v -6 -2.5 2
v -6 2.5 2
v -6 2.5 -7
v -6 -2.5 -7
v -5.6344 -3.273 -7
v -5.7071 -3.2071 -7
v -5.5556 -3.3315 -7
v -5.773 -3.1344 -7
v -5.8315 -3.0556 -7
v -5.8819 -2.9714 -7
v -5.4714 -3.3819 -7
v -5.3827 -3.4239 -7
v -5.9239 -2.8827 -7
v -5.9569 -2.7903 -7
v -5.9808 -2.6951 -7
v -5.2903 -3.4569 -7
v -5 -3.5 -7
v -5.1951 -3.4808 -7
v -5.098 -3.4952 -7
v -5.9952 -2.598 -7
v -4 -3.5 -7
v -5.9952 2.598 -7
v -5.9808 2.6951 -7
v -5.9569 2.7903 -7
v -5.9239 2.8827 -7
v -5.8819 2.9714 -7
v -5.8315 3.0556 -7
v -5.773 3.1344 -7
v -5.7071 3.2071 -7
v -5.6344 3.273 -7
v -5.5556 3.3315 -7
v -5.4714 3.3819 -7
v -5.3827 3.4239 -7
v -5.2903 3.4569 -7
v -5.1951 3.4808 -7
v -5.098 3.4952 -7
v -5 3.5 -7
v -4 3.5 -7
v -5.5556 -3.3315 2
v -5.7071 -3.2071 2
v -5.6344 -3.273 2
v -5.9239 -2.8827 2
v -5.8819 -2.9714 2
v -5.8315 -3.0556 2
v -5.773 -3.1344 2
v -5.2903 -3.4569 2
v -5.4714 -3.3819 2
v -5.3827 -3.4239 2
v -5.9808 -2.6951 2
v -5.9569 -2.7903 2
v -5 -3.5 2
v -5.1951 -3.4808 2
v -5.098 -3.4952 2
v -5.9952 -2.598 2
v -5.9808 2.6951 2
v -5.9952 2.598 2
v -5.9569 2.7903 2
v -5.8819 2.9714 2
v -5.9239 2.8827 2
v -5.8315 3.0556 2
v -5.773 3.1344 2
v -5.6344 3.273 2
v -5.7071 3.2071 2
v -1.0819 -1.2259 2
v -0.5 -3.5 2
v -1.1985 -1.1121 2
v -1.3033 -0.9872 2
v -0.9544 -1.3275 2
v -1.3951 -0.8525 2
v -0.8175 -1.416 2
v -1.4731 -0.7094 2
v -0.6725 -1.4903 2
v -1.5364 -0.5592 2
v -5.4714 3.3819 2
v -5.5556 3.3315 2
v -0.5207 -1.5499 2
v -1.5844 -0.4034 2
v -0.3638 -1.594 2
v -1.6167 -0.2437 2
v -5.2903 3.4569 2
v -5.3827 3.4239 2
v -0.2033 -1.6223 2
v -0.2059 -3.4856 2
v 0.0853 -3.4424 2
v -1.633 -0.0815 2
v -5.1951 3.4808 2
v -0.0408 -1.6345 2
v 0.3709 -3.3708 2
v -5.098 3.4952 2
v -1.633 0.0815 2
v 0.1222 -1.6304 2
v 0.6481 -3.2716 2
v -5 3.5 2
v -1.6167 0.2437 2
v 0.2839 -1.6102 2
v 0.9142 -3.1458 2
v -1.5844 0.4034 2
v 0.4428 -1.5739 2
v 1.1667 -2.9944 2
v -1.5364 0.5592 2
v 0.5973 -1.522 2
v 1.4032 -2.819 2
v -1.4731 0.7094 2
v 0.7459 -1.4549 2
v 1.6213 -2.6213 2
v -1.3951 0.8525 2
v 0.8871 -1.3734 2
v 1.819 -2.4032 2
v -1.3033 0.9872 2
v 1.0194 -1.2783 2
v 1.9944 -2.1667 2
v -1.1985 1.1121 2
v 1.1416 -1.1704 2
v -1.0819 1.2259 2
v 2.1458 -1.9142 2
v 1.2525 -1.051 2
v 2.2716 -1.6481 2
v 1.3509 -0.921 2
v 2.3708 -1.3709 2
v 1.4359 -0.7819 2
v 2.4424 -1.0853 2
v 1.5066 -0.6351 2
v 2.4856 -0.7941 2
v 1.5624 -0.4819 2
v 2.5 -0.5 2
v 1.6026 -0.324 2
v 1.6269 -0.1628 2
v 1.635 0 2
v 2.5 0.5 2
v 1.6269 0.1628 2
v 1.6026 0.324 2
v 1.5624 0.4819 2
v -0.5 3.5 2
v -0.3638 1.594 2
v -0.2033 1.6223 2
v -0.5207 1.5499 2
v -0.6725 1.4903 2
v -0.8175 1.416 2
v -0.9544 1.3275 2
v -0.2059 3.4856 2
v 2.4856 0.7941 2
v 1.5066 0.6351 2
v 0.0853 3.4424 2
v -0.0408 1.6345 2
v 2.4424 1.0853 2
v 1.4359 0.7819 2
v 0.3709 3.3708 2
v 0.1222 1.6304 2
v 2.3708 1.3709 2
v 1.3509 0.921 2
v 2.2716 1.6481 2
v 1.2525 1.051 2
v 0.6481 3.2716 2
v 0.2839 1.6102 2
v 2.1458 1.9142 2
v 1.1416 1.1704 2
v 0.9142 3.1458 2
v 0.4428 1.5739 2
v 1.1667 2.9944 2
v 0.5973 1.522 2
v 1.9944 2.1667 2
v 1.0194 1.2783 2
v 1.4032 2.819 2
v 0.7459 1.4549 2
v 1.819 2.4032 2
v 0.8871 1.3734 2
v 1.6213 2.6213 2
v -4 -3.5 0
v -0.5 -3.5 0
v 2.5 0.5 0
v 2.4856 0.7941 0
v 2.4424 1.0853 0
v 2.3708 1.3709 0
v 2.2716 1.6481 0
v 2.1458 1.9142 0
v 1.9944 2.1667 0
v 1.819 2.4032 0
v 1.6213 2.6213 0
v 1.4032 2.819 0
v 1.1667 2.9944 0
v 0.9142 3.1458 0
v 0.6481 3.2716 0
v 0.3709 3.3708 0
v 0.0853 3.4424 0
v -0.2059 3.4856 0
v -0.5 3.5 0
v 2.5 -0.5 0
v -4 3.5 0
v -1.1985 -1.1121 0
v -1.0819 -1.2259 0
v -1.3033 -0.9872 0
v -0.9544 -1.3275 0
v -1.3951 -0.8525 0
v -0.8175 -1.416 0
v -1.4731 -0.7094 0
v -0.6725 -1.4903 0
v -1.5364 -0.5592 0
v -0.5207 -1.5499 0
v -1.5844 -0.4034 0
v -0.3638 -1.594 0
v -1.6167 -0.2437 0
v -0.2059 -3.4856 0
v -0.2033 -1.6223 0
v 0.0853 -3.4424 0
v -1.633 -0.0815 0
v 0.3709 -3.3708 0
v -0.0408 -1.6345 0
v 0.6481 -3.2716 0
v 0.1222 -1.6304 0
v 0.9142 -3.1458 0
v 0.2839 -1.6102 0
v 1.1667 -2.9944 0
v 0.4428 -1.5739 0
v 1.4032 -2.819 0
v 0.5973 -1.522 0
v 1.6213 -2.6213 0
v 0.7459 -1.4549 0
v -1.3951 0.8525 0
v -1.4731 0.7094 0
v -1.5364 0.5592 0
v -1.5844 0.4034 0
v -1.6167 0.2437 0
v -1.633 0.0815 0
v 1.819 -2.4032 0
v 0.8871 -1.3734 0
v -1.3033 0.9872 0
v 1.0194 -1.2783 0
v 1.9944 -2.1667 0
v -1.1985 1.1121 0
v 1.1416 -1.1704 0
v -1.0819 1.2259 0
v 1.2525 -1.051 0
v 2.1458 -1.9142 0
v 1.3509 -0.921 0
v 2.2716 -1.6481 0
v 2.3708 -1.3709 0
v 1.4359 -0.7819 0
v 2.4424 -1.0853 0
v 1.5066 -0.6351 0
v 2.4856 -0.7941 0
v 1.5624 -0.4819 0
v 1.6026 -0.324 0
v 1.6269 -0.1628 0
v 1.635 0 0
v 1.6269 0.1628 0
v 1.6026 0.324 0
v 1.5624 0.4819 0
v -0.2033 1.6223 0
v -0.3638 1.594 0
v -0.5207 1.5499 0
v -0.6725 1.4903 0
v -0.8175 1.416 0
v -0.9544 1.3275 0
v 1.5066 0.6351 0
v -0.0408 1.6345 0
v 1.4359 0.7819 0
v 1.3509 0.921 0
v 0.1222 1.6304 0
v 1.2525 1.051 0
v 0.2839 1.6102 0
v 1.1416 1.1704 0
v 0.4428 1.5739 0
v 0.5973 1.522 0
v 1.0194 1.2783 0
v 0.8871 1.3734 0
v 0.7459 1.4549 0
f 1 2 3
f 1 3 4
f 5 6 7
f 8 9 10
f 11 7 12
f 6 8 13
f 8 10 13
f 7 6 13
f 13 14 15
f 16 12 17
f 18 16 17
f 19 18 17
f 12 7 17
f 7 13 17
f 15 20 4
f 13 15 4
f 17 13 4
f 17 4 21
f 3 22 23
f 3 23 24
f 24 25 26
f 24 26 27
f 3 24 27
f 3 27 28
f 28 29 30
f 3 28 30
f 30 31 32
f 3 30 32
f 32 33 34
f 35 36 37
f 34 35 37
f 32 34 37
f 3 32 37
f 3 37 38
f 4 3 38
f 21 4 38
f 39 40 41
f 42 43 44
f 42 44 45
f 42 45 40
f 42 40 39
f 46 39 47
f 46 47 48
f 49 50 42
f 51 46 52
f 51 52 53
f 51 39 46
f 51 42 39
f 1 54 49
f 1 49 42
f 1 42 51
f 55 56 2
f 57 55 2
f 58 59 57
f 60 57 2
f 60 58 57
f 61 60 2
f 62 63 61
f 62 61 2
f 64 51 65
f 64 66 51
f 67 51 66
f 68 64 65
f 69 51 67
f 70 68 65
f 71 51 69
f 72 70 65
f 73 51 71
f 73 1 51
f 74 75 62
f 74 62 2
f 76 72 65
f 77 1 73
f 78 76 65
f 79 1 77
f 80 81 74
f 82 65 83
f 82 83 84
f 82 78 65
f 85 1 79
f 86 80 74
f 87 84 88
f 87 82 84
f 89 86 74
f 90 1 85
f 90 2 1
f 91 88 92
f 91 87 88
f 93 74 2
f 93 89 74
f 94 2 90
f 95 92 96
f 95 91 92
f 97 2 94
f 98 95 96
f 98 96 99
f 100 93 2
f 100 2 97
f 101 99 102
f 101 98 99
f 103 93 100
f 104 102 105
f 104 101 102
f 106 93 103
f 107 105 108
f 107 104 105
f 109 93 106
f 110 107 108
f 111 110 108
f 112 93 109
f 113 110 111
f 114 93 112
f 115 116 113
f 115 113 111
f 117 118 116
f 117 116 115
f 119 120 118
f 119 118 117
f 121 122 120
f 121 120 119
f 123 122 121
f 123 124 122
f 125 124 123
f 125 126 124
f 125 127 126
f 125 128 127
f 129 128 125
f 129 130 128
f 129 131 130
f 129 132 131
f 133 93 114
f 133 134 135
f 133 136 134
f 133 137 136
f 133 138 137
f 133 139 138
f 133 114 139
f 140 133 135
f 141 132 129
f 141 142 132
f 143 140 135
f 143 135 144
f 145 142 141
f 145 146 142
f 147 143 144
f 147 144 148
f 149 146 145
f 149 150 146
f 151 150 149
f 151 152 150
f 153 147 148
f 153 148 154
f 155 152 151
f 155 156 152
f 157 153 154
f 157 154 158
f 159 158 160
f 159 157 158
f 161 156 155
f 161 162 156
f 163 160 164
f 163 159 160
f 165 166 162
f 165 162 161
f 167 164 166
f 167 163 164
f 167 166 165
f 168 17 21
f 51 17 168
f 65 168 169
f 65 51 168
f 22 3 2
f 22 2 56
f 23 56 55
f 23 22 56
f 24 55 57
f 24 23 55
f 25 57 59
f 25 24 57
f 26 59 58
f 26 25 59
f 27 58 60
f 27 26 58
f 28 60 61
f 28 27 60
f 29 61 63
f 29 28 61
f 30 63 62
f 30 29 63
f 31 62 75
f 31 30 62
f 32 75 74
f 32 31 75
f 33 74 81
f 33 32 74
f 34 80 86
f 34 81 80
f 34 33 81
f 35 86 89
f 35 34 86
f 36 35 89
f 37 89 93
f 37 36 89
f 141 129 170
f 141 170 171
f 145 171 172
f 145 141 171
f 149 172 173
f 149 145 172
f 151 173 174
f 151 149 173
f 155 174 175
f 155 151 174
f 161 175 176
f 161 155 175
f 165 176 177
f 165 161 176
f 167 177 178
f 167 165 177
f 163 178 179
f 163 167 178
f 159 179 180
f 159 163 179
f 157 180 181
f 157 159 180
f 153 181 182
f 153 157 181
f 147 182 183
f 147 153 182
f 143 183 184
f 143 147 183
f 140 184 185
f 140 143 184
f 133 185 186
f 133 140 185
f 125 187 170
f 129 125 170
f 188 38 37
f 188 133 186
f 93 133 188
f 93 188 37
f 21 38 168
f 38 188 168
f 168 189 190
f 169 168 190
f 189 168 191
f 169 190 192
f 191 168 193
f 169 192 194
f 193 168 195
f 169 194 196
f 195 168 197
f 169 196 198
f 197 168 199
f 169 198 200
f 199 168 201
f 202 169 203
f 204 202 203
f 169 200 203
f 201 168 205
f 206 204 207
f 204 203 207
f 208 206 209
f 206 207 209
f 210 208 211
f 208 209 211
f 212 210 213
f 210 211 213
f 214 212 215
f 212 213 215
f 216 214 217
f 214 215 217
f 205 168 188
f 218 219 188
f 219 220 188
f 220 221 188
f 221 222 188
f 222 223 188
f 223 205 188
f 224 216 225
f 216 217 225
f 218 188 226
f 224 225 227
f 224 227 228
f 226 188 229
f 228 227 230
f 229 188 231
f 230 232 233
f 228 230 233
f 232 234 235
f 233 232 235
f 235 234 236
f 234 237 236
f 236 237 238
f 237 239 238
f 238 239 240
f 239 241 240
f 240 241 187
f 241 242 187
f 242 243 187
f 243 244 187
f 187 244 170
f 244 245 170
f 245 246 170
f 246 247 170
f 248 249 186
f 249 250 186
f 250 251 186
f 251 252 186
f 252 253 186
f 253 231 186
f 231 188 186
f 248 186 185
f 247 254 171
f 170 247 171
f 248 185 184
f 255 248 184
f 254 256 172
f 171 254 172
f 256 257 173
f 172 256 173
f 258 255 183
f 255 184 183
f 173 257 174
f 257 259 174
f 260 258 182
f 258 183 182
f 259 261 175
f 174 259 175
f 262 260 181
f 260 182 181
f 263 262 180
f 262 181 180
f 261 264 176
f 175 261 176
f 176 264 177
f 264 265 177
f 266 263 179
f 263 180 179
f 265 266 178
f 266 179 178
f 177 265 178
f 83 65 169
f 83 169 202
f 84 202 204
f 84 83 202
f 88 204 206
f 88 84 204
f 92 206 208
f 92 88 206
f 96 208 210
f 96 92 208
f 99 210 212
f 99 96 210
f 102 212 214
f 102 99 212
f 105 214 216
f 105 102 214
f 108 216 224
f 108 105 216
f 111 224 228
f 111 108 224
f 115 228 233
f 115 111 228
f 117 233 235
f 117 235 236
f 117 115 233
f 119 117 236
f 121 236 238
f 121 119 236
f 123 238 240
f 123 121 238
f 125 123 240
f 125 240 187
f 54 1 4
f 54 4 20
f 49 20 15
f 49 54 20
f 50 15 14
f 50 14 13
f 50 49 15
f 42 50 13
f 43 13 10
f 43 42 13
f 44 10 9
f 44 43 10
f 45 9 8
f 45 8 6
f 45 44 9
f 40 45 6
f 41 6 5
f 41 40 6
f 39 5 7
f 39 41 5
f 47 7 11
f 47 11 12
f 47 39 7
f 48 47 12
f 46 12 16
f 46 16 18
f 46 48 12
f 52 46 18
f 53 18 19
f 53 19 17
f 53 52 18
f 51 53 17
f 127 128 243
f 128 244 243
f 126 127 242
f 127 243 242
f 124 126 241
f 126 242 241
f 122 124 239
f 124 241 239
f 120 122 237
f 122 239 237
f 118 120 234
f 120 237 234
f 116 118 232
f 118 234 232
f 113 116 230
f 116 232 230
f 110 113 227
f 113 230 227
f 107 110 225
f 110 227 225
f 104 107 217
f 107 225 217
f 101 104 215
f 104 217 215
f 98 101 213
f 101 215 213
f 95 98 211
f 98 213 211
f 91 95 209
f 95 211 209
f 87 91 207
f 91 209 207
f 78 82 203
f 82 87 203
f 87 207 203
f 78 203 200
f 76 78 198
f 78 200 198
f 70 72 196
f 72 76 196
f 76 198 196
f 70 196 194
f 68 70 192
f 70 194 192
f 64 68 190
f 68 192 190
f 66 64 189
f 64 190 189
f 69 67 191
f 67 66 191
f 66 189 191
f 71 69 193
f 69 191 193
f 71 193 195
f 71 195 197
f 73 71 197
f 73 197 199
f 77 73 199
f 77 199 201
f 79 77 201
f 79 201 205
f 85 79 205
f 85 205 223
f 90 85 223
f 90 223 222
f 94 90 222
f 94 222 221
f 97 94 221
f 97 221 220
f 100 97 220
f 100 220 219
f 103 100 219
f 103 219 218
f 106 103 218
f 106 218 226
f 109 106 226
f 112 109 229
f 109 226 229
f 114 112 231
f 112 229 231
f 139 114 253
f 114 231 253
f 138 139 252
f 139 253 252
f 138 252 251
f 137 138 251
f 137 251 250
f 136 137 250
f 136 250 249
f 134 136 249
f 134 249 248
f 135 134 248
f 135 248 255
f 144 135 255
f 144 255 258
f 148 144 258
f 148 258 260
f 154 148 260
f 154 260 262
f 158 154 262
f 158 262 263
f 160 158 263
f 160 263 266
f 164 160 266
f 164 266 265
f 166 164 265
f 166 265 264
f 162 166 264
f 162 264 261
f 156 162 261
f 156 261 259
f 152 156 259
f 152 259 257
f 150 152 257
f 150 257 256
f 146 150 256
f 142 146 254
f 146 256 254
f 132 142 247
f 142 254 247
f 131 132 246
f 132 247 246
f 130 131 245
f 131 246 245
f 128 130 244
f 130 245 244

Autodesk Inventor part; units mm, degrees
ref_plane "YZ Plane" through (0, 0, 0) normal (1, 0, 0) x (0, 1, 0)
ref_plane "XZ Plane" through (0, 0, 0) normal (0, 1, 0) x (-1, 0, 0)
ref_plane "XY Plane" through (0, 0, 0) normal (0, 0, 1) x (1, 0, 0)
sketch "スケッチ1" plane through (0, 0, 0) normal (0, 0, 1) x (1, 0, 0)
  circle A0 centre (0, 0) radius 1.635
  line L0 (-6, -3.5) -> (2.5, -3.5)
  line L1 (2.5, -3.5) -> (2.5, 3.5)
  line L2 (2.5, 3.5) -> (-6, 3.5)
  line L3 (-6, 3.5) -> (-6, -3.5)
  line L4 (-6, -3.5) -> (2.5, 3.5) construction
  line L5 (2.5, -3.5) -> (-6, 3.5) construction
  line L6 (-6, 0) -> (2.5, 0) construction
  line L7 (-4, 3.5) -> (-4, -3.5)
  point P0 (-1.75, 0)
  dimension "d0" = 3.27
  dimension "d1" = 7
  dimension "d2" = 2.5
  dimension "d3" = 6
  dimension "d6" = 2
extrude "押し出し1" add sketch "スケッチ1" along normal blind 2
extrude "押し出し2" add sketch "スケッチ1" against normal blind 7 contours L3 L2 L7 L0
fillet "フィレット1" radius 3 2 edges at (2.5, 3.5, 1) (2.5, -3.5, 1)
fillet "フィレット2" radius 1 2 edges at (-6, -3.5, -2.5) (-6, 3.5, -2.5)
properties part number "guide_link"
